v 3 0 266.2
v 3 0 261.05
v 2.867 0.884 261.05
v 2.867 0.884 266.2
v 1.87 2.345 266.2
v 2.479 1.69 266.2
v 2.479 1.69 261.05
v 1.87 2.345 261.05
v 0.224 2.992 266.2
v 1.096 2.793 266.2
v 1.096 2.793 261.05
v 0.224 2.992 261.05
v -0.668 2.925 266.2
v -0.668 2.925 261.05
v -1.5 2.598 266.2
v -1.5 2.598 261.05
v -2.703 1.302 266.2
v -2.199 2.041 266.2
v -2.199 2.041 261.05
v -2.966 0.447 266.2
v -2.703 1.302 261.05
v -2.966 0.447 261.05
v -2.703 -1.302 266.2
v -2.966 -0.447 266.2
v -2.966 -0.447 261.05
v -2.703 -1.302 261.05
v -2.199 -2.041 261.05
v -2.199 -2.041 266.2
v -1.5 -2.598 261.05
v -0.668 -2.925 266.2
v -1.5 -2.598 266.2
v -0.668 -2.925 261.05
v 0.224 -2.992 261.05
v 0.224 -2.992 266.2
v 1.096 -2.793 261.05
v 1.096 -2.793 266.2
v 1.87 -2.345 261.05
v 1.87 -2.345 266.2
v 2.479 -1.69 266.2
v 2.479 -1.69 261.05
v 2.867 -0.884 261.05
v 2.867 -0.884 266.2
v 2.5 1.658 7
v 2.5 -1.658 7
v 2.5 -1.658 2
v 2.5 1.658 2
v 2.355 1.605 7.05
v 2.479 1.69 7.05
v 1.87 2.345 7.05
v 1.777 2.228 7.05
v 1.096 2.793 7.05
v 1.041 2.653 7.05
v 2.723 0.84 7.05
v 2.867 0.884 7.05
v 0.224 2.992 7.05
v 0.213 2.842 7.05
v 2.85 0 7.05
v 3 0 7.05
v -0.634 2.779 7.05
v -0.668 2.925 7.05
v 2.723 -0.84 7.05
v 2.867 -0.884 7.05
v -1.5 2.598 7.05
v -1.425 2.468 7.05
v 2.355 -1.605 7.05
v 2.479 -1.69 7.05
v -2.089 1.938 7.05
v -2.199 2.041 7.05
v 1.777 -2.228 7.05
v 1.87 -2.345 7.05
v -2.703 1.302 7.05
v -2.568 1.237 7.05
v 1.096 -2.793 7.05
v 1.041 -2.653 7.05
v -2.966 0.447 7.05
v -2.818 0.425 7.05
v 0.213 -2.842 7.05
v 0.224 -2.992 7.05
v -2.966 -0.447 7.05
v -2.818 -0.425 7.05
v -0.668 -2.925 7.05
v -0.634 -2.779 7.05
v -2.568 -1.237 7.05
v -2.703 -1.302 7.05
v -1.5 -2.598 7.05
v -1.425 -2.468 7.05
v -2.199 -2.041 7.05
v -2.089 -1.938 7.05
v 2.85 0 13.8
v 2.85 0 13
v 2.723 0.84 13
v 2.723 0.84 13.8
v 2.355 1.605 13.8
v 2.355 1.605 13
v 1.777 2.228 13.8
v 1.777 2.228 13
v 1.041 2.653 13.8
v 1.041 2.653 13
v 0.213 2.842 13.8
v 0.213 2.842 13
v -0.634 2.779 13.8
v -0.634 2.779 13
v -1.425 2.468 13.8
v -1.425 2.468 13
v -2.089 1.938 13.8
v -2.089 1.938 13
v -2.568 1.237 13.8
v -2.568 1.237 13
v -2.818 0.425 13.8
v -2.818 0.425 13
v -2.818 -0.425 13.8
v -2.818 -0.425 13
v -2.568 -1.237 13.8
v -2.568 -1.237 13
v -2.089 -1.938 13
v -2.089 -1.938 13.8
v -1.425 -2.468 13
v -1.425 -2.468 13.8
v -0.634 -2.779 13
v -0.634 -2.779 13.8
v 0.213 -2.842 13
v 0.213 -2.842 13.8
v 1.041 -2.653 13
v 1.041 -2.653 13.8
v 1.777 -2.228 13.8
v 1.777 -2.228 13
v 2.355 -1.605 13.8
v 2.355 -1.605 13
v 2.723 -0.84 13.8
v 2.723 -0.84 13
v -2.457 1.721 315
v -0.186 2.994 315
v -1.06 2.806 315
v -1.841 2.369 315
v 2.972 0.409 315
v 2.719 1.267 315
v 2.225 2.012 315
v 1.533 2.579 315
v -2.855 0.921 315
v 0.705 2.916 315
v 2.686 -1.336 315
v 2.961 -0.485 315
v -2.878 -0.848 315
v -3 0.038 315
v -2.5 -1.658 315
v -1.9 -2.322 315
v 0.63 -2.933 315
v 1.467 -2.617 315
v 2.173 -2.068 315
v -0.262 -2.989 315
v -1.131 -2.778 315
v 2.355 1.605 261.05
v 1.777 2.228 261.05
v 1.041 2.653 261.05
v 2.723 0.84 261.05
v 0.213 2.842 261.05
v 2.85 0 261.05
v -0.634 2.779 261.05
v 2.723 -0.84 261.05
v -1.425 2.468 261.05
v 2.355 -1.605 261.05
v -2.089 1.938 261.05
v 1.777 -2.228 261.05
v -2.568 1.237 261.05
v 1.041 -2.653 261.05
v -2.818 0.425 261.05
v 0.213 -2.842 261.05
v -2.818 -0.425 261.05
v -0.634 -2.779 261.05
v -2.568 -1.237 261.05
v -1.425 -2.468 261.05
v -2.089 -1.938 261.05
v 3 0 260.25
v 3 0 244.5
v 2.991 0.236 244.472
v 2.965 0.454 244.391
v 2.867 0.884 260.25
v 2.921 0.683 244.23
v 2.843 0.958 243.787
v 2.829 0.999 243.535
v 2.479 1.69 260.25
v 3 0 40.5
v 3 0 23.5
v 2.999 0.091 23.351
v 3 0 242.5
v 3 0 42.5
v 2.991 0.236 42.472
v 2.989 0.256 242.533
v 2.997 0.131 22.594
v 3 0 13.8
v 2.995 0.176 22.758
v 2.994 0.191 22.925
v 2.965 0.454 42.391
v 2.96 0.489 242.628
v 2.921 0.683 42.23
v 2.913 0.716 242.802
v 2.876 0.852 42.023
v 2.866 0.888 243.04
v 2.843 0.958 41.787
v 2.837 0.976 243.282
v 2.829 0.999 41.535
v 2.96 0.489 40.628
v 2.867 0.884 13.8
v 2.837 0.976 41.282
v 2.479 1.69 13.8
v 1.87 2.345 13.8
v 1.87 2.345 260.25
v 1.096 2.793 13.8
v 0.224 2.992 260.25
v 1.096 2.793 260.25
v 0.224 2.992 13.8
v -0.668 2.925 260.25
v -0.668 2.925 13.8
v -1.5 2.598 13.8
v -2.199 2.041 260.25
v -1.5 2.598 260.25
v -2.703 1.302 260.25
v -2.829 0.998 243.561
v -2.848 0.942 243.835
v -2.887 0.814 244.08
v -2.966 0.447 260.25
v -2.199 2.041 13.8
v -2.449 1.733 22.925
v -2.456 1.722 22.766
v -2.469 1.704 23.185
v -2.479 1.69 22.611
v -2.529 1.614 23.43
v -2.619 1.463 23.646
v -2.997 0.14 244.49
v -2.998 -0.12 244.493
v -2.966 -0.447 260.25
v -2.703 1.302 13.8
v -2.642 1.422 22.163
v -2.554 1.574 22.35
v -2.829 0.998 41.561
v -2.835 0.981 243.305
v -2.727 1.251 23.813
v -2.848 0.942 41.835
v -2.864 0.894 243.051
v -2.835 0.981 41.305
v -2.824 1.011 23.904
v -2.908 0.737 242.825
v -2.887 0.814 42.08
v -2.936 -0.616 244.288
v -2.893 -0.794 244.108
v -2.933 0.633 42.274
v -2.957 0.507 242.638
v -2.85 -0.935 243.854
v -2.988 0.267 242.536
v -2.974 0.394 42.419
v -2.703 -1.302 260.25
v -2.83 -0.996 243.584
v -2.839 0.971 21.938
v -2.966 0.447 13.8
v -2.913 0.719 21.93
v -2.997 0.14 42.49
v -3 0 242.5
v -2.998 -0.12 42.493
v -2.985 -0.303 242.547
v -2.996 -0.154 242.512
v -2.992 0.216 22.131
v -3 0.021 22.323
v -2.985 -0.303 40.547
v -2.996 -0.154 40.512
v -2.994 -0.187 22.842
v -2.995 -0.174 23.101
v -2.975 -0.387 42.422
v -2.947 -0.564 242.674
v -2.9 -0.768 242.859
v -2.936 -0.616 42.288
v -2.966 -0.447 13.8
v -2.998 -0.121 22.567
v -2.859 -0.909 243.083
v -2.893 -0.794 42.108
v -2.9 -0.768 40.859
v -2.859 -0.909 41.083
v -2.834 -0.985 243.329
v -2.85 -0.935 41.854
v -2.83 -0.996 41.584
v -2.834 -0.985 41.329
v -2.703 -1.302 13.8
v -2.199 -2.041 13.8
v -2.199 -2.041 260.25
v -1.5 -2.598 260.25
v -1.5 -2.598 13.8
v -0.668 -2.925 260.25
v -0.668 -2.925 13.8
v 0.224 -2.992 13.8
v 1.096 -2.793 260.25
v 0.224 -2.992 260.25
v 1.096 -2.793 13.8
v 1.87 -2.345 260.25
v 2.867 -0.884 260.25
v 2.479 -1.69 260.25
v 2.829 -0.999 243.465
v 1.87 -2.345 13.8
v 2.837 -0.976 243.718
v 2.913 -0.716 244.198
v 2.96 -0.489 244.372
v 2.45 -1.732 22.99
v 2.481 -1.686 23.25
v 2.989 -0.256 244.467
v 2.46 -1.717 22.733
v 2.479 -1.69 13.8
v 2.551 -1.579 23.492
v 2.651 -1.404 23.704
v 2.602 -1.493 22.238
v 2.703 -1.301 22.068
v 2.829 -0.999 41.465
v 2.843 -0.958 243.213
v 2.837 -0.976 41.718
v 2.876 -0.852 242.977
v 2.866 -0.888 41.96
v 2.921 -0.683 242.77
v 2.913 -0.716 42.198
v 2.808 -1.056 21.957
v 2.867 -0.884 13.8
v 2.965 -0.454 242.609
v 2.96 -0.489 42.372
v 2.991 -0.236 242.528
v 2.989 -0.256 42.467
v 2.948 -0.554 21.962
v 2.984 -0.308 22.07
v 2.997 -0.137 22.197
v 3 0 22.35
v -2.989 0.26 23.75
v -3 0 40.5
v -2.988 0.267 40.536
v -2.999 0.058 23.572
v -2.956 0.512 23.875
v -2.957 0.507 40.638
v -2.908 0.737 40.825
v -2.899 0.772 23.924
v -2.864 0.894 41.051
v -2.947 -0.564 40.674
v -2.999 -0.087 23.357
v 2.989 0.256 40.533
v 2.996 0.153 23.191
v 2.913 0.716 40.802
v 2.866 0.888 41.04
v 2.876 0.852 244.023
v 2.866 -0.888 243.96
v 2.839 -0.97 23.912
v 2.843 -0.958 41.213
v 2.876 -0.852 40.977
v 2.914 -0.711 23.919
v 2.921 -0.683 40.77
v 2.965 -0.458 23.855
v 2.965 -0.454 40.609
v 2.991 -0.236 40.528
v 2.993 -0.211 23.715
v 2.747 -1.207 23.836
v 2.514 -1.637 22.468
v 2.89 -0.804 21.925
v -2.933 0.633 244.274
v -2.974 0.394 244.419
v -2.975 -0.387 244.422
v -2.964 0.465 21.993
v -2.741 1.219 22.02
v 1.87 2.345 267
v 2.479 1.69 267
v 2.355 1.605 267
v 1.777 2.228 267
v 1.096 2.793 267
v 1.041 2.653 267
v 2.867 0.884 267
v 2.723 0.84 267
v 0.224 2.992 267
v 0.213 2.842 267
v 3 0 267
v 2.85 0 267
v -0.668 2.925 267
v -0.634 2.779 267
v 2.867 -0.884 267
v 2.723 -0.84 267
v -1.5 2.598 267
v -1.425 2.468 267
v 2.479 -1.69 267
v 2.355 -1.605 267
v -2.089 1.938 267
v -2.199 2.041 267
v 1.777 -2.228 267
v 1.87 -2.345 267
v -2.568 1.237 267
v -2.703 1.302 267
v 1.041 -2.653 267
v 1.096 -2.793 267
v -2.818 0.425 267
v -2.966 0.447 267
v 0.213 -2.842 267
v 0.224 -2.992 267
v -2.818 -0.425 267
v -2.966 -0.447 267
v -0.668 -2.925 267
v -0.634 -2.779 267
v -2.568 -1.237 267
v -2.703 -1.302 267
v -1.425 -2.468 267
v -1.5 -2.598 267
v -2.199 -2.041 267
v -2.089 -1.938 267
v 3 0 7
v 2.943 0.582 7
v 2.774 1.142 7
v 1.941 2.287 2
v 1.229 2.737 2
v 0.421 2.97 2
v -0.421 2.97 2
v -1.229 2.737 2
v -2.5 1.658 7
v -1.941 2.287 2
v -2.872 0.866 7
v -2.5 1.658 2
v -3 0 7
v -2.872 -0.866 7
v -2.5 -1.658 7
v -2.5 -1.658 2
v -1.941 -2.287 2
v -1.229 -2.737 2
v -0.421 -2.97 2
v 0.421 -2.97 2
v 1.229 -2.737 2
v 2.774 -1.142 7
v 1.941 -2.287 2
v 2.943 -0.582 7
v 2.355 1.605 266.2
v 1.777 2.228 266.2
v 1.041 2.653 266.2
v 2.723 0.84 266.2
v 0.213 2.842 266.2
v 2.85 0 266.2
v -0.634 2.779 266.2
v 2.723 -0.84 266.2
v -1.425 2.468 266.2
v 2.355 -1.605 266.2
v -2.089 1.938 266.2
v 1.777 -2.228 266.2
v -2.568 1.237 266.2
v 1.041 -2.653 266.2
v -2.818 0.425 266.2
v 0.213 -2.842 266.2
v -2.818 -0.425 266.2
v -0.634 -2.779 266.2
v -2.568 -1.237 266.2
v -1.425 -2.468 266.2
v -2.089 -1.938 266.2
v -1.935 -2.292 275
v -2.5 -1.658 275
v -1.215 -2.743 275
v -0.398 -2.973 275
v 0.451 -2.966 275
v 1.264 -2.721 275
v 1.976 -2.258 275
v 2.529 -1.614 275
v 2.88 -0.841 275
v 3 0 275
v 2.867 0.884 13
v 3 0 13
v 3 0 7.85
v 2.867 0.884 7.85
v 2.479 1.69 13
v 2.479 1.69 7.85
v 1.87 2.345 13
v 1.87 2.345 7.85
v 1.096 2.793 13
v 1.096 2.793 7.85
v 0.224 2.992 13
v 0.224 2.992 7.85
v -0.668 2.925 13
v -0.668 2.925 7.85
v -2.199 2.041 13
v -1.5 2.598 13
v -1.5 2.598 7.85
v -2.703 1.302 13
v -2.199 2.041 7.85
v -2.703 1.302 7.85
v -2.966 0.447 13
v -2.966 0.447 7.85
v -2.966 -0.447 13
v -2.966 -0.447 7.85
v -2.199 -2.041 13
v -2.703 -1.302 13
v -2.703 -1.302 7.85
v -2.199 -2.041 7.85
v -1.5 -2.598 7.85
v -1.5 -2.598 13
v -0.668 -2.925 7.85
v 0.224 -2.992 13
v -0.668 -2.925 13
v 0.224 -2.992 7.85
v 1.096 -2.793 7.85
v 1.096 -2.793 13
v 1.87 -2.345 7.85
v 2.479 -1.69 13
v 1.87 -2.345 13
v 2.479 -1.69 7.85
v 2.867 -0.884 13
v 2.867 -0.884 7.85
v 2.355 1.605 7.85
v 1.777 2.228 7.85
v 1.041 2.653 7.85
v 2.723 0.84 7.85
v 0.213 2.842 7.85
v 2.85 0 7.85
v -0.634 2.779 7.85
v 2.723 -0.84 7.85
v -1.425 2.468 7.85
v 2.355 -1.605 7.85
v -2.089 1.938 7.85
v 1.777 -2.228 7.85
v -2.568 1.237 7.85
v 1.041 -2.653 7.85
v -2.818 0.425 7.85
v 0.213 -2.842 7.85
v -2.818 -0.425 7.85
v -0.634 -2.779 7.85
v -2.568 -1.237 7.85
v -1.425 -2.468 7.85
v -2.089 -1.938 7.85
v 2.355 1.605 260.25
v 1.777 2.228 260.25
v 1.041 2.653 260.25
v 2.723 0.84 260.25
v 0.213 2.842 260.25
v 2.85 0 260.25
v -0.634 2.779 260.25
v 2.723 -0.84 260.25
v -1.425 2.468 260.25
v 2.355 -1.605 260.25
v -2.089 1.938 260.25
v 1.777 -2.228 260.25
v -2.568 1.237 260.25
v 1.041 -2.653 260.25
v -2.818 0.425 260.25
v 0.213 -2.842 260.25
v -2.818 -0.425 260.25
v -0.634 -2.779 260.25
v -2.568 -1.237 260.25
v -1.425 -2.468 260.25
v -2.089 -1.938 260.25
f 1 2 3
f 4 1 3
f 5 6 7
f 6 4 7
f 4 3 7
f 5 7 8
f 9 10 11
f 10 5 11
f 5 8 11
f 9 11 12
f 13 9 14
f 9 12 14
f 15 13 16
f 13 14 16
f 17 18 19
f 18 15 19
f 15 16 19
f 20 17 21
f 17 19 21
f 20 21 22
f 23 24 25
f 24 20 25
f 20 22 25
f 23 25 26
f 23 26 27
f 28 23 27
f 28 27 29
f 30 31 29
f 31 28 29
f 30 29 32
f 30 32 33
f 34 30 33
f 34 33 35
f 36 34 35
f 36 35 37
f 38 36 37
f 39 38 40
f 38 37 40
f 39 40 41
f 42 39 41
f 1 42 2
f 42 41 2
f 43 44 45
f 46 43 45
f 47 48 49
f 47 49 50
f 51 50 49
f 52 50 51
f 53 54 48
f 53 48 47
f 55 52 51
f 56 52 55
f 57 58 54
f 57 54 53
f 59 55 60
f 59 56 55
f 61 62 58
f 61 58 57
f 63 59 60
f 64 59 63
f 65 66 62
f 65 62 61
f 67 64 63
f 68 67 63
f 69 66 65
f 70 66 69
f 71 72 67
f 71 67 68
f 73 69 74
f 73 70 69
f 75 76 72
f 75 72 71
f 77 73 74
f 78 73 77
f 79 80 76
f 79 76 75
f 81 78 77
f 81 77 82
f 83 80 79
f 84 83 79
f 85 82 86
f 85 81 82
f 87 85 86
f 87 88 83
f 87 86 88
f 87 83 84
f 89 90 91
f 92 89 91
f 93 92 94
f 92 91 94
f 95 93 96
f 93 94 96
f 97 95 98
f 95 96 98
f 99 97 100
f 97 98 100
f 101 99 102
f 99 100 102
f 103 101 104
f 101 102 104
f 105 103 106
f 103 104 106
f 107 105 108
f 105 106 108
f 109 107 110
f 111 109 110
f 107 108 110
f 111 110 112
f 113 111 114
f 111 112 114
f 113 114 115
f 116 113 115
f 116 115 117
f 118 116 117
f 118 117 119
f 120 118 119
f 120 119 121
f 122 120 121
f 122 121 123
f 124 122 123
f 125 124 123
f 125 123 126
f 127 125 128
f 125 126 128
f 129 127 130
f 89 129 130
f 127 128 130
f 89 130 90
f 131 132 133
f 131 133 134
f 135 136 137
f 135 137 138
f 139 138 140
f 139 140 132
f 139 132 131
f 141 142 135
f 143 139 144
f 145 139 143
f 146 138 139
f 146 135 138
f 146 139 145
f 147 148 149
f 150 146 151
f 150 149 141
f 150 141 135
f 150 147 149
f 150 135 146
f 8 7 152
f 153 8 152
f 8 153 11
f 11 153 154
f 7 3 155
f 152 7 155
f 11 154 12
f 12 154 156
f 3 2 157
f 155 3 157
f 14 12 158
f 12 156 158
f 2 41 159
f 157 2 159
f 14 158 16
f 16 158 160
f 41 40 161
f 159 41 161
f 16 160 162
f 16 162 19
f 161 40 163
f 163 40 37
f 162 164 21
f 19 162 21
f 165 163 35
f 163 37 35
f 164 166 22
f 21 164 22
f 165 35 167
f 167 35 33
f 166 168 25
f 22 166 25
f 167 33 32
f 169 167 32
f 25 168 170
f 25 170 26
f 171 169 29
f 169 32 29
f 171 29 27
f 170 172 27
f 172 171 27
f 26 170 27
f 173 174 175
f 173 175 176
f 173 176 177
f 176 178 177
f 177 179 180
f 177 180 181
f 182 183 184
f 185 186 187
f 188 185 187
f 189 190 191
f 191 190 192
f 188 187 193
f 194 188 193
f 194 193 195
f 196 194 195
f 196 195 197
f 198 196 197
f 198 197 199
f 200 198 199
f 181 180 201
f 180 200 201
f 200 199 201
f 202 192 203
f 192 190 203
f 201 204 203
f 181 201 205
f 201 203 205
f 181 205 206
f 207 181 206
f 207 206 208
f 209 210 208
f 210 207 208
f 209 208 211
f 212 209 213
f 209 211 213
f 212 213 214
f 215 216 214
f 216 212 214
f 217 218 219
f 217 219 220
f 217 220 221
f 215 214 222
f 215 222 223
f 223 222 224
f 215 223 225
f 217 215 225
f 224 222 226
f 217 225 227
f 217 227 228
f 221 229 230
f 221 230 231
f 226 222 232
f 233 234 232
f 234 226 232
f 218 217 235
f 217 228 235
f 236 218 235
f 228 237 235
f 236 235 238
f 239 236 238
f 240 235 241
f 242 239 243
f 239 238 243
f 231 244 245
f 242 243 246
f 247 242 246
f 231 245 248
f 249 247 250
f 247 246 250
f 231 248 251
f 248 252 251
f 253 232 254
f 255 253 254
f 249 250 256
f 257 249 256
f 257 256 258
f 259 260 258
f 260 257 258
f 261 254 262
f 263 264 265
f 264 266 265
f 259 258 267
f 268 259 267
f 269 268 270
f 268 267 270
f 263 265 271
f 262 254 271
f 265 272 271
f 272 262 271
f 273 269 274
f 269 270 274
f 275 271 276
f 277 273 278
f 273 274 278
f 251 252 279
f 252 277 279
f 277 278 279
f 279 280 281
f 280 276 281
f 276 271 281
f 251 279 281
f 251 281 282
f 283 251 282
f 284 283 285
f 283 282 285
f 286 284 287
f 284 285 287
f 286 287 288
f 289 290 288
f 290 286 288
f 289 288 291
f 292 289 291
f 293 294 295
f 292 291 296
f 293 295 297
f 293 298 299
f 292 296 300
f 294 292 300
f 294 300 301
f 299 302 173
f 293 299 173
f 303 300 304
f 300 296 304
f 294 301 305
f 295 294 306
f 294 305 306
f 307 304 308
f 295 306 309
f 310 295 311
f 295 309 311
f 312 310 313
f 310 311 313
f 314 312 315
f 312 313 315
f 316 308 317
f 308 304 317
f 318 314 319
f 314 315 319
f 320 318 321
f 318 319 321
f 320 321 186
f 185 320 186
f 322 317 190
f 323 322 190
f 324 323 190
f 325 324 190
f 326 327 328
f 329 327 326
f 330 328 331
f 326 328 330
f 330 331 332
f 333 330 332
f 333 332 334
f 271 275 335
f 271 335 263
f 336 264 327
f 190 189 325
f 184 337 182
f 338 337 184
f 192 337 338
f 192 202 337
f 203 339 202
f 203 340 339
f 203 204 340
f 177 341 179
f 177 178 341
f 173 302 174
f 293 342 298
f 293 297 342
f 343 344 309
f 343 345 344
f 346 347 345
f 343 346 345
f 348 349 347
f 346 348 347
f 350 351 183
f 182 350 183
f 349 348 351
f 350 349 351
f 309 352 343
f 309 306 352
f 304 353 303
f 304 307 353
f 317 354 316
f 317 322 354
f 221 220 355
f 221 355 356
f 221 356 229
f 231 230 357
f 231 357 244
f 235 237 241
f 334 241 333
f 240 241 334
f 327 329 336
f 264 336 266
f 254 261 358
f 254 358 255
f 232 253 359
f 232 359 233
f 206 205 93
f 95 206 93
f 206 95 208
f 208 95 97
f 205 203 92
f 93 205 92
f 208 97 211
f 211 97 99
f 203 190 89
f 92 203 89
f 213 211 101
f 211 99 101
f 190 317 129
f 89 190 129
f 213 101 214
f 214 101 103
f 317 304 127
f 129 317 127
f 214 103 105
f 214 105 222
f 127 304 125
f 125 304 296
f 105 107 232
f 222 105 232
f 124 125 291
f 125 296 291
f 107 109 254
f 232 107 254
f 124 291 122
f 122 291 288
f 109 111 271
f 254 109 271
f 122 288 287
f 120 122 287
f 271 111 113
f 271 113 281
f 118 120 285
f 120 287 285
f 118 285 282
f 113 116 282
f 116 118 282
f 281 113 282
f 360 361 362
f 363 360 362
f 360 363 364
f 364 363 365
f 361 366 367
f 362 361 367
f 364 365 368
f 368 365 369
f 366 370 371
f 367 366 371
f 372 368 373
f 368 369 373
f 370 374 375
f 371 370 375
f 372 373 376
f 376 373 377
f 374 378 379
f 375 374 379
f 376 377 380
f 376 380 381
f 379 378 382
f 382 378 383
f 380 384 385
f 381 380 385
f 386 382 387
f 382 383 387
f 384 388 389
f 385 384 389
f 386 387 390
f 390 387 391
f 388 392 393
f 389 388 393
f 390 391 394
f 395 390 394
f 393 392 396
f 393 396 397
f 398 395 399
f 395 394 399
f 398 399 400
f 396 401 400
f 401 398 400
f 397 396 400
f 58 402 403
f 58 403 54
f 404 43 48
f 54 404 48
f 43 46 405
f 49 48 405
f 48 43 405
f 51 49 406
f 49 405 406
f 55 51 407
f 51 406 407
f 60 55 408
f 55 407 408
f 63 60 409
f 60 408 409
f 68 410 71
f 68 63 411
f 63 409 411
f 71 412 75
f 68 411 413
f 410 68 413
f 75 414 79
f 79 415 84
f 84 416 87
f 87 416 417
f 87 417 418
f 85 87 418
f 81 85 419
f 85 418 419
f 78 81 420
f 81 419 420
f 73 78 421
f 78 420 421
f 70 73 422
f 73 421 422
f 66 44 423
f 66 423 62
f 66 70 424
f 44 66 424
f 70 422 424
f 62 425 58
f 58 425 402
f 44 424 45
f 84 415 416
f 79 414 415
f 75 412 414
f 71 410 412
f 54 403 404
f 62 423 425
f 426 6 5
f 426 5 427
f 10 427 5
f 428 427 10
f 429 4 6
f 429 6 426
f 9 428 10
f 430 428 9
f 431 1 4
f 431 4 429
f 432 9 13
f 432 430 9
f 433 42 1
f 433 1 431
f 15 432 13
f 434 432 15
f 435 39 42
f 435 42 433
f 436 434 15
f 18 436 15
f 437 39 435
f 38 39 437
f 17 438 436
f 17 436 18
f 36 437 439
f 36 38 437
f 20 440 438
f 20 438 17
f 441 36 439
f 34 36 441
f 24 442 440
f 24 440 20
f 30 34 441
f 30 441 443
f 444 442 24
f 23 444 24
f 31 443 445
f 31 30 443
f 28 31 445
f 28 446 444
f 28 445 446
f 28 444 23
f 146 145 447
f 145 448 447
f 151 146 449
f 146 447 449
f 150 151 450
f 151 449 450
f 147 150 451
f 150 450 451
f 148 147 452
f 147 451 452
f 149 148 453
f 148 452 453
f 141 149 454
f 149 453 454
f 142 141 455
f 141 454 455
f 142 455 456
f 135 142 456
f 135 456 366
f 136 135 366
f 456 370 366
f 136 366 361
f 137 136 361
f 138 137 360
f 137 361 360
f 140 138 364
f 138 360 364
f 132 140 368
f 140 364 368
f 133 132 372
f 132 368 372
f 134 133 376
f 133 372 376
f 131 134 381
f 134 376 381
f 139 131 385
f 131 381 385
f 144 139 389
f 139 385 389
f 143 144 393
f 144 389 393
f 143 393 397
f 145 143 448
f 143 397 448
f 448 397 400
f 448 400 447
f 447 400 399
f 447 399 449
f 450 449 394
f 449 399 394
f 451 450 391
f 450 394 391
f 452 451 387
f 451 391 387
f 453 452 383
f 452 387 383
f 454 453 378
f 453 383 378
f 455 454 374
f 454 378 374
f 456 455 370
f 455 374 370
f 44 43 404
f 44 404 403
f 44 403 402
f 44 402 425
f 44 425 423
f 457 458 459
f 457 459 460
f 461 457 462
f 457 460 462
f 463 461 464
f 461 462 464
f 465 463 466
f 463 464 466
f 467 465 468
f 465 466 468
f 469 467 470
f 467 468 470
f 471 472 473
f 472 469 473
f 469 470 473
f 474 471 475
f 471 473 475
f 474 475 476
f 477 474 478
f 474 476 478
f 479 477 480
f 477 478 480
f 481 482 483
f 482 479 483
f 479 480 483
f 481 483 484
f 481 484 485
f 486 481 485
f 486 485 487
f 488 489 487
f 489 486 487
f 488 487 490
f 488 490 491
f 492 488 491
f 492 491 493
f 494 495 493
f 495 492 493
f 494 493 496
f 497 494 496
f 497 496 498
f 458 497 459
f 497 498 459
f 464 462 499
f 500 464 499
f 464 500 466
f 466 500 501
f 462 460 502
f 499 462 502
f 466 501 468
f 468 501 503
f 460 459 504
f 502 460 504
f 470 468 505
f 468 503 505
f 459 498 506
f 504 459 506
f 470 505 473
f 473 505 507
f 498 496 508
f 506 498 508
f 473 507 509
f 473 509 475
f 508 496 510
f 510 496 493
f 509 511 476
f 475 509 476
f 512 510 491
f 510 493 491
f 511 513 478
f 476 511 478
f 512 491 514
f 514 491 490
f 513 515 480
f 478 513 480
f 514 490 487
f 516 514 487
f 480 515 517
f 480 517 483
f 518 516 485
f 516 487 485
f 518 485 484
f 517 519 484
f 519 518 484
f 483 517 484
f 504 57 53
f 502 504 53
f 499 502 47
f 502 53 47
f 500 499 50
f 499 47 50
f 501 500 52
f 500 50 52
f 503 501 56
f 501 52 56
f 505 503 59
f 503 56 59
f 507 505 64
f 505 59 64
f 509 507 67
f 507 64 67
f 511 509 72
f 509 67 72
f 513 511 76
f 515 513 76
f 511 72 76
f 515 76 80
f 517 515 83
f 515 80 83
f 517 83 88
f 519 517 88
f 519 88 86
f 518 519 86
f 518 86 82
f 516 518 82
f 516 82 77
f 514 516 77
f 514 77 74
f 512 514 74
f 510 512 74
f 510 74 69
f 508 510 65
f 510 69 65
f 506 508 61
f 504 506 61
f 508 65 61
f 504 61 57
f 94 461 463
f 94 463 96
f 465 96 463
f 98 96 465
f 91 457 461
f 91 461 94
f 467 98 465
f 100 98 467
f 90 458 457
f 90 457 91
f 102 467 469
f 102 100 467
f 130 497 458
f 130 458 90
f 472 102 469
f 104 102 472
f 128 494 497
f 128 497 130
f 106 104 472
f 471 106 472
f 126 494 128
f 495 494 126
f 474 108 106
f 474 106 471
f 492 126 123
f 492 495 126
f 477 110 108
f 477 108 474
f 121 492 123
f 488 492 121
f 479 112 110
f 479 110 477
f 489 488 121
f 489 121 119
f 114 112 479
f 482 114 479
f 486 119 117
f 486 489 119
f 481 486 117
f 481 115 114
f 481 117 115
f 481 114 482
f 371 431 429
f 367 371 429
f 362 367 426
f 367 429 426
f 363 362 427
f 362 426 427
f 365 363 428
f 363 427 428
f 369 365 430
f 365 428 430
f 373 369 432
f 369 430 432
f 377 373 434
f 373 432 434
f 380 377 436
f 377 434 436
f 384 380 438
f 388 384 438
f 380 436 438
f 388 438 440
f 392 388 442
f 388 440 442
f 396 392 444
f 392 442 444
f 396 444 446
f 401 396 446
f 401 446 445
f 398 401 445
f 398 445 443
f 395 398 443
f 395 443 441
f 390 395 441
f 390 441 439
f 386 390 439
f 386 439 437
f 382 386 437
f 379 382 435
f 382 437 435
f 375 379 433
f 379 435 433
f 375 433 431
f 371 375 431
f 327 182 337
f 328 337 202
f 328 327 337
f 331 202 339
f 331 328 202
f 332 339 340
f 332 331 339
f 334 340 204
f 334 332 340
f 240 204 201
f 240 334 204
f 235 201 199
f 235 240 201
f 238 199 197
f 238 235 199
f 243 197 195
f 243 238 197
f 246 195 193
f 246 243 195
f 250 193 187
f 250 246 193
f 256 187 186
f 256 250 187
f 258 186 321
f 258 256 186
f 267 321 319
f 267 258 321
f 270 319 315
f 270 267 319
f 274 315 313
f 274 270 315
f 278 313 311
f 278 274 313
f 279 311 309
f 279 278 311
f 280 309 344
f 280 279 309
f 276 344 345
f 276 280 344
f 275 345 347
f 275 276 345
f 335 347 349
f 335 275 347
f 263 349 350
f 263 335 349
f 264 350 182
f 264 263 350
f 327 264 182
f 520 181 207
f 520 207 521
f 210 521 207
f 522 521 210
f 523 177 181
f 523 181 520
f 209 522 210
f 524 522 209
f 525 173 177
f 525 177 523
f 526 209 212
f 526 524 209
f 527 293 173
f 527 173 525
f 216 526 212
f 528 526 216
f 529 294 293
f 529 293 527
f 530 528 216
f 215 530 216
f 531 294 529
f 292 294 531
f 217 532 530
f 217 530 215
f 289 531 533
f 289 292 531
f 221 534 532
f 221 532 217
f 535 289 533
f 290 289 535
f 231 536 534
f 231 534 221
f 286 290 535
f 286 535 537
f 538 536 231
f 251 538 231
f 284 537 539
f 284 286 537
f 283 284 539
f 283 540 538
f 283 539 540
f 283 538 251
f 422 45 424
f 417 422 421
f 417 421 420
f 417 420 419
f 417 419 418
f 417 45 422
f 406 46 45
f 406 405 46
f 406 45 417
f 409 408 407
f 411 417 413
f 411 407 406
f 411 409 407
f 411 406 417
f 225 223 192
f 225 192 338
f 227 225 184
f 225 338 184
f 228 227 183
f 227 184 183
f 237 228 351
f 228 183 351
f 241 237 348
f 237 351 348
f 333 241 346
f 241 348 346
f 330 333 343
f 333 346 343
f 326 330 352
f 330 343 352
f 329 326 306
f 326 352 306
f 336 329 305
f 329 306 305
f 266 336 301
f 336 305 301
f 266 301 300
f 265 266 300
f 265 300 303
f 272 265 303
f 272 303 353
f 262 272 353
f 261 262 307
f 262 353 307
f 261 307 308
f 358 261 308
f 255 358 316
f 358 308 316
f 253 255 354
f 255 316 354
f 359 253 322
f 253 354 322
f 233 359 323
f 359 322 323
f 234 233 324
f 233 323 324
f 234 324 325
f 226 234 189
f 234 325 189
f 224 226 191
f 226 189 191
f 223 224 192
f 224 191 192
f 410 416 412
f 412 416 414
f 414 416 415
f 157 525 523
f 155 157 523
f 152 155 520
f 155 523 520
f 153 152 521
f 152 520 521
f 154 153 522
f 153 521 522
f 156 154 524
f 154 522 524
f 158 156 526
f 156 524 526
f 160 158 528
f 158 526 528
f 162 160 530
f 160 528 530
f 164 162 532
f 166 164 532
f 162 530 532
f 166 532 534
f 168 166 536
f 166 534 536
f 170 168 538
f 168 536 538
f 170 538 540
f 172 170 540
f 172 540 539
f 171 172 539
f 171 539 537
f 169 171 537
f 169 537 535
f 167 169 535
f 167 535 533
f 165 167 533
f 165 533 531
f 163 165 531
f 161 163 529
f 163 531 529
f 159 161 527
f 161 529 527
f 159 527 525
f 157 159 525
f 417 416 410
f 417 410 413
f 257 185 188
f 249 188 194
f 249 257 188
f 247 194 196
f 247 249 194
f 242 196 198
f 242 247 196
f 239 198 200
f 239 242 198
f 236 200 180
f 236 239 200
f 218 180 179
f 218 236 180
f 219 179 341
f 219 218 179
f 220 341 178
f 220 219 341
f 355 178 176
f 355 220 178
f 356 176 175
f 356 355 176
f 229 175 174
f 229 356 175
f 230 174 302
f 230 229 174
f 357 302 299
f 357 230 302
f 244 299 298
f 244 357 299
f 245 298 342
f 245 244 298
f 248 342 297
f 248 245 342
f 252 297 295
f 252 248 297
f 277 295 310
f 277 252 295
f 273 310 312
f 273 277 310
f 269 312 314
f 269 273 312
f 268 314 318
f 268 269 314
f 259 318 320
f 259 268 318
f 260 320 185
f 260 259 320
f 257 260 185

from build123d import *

# Parameters (mm, degrees)
SKETCH1_R                                  = 3
BOSS_EXTRUDE1_DEPTH                        = 275
SKETCH3_W                                  = 0.8
SKETCH3_H                                  = 0.5
CUT_EXTRUDE2_DEPTH                         = 276.032725326
CUT_EXTRUDE2_DEPTH_BACK                    = 276.032725326
SKETCH4_W                                  = 3.470061058
SKETCH4_H                                  = 7
SKETCH4_W_2                                = 2.92528695
CHAMFER1_SIZE                              = 0.3
RETAINING_GROOVES_D5P7_1_START             = 7.05
SKETCH5_R                                  = 2.85
SKETCH5_R_2                                = 2.49
RETAINING_GROOVES_D5P7_1_DEPTH             = 0.8
RETAINING_GROOVES_D5P7_2_START             = 13
SKETCH6_R                                  = 2.85
SKETCH6_R_2                                = 2.49
RETAINING_GROOVES_D5P7_2_DEPTH             = 0.8
RETAINING_GROOVES_D5P7_3_START             = 260.25
SKETCH7_R                                  = 2.85
SKETCH7_R_2                                = 2.49
RETAINING_GROOVES_D5P7_3_DEPTH             = 0.8
RETAINING_GROOVES_D5P7_4_START             = 266.2
SKETCH8_R                                  = 2.85
SKETCH8_R_2                                = 2.49
RETAINING_GROOVES_D5P7_4_DEPTH             = 0.8
TWO_HUB_CROSS_PIN_D2_DEPTH                 = 276.032725326
TWO_HUB_CROSS_PIN_D2_DEPTH_BACK            = 276.032725326
SKETCH9_R                                  = 1
SKETCH10_R                                 = 3.1
REVB_LOWER_SHAFT_NOSE_CLEARANCE_2MM_DEPTH  = 2
REVB_OLDHAM_D2_DRIVE_PIN_CLOCKED_HOLE_OU_W = 1
REVB_OLDHAM_D2_DRIVE_PIN_CLOCKED_HOLE_OU_H = 6.000106441
BENCH_ONEPIECE_SHAFT_END_TO315_START       = 275
SKETCH11_R                                 = 3
BENCH_ONEPIECE_SHAFT_END_TO315_DEPTH       = 40


# Read off the part's stored shape, not the designer's step: RevB_Oldham_D2_Drive_Pin_Clocked_Hole
with BuildPart() as part:
    # Sketch1 → Boss-Extrude1 (new body)
    with BuildSketch(Plane.XY):
        Circle(SKETCH1_R)
    extrude(amount=BOSS_EXTRUDE1_DEPTH)

    # Sketch3 → Cut-Revolve1 (revolve, cut)
    with BuildSketch(Plane(origin=(0, 0, 0), x_dir=(0, 0, -1), z_dir=(1, 0, 0)), mode=Mode.PRIVATE) as cut_revolve1_sk:
        with Locations((-266.6, 2.75)):
            Rectangle(SKETCH3_W, SKETCH3_H)
        with Locations((-260.65, 2.75)):
            Rectangle(SKETCH3_W, SKETCH3_H)
        with Locations((-13.4, 2.75)):
            Rectangle(SKETCH3_W, SKETCH3_H)
        with Locations((-7.45, 2.75)):
            Rectangle(SKETCH3_W, SKETCH3_H)
    revolve(cut_revolve1_sk.sketch.rotate(Axis((0, 0, 263.365004794), (0, 0, -1)), 90), axis=Axis((0, 0, 263.365004794), (0, 0, -1)), mode=Mode.SUBTRACT)

    # Sketch4 → Cut-Extrude2 (cut, two sides: drawn at the far end of the back side and taken through both)
    with BuildSketch(Plane(origin=(0, 0, 0), x_dir=(1, 0, 0), z_dir=(0, 1, 0)).offset(-CUT_EXTRUDE2_DEPTH_BACK)):
        with Locations((4.235030529, -3.5)):
            Rectangle(SKETCH4_W, SKETCH4_H)
        with Locations((-3.962643475, -3.5)):
            Rectangle(SKETCH4_W_2, SKETCH4_H)
    extrude(amount=CUT_EXTRUDE2_DEPTH + CUT_EXTRUDE2_DEPTH_BACK, mode=Mode.SUBTRACT)

    # Chamfer1
    chamfer1_edges = [part.edges().sort_by_distance(p)[0] for p in [
        (0, 3, 0),
        (0, -3, 0),
    ]]
    chamfer(chamfer1_edges, length=CHAMFER1_SIZE)

    # Sketch5 → Retaining_Grooves_D5p7_1 (add)
    with BuildSketch(Plane.XY.offset(RETAINING_GROOVES_D5P7_1_START)):
        Circle(SKETCH5_R)
        Circle(SKETCH5_R_2, mode=Mode.SUBTRACT)
    extrude(amount=RETAINING_GROOVES_D5P7_1_DEPTH)

    # Sketch6 → Retaining_Grooves_D5p7_2 (add)
    with BuildSketch(Plane.XY.offset(RETAINING_GROOVES_D5P7_2_START)):
        Circle(SKETCH6_R)
        Circle(SKETCH6_R_2, mode=Mode.SUBTRACT)
    extrude(amount=RETAINING_GROOVES_D5P7_2_DEPTH)

    # Sketch7 → Retaining_Grooves_D5p7_3 (add)
    with BuildSketch(Plane.XY.offset(RETAINING_GROOVES_D5P7_3_START)):
        Circle(SKETCH7_R)
        Circle(SKETCH7_R_2, mode=Mode.SUBTRACT)
    extrude(amount=RETAINING_GROOVES_D5P7_3_DEPTH)

    # Sketch8 → Retaining_Grooves_D5p7_4 (add)
    with BuildSketch(Plane.XY.offset(RETAINING_GROOVES_D5P7_4_START)):
        Circle(SKETCH8_R)
        Circle(SKETCH8_R_2, mode=Mode.SUBTRACT)
    extrude(amount=RETAINING_GROOVES_D5P7_4_DEPTH)

    # Sketch9 → Two_Hub_Cross_Pin_D2 (cut, two sides: drawn at the far end of the back side and taken through both)
    with BuildSketch(Plane(origin=(0, 0, 0), x_dir=(0, 0, -1), z_dir=(1, 0, 0)).offset(-TWO_HUB_CROSS_PIN_D2_DEPTH_BACK)):
        with Locations((-41.5, 0)):
            Circle(SKETCH9_R)
        with Locations((-243.5, 0)):
            Circle(SKETCH9_R)
    extrude(amount=TWO_HUB_CROSS_PIN_D2_DEPTH + TWO_HUB_CROSS_PIN_D2_DEPTH_BACK, mode=Mode.SUBTRACT)

    # Sketch10 → RevB_Lower_Shaft_Nose_Clearance_2mm (cut)
    with BuildSketch(Plane(origin=(0, 0, 0), x_dir=(-1, 0, 0), z_dir=(0, 0, -1))):
        Circle(SKETCH10_R)
    extrude(amount=-REVB_LOWER_SHAFT_NOSE_CLEARANCE_2MM_DEPTH, mode=Mode.SUBTRACT)

    # RevB_Oldham_D2_Drive_Pin_Clocked_Hole ou → RevB_Oldham_D2_Drive_Pin_Clocked_Hole (revolve, cut)
    with BuildSketch(Plane(origin=(0, 0, 22.925), x_dir=(0.2727065426398811, 0.962097262027807, 0), z_dir=(0, 0, -1))):
        with Locations((0.5, 2.6843e-05)):
            Rectangle(REVB_OLDHAM_D2_DRIVE_PIN_CLOCKED_HOLE_OU_W, REVB_OLDHAM_D2_DRIVE_PIN_CLOCKED_HOLE_OU_H)
    revolve(axis=Axis((0, 0, 22.925), (0.962097262027807, -0.2727065426398811, 0)), mode=Mode.SUBTRACT)

    # Sketch11 → Bench_OnePiece_Shaft_End_To315 (add)
    with BuildSketch(Plane.XY.offset(BENCH_ONEPIECE_SHAFT_END_TO315_START)):
        with Locations(Location((0, 0, 0), (0, 0, 213.557309762))):
            Circle(SKETCH11_R)
    extrude(amount=BENCH_ONEPIECE_SHAFT_END_TO315_DEPTH)


solid = part.part
